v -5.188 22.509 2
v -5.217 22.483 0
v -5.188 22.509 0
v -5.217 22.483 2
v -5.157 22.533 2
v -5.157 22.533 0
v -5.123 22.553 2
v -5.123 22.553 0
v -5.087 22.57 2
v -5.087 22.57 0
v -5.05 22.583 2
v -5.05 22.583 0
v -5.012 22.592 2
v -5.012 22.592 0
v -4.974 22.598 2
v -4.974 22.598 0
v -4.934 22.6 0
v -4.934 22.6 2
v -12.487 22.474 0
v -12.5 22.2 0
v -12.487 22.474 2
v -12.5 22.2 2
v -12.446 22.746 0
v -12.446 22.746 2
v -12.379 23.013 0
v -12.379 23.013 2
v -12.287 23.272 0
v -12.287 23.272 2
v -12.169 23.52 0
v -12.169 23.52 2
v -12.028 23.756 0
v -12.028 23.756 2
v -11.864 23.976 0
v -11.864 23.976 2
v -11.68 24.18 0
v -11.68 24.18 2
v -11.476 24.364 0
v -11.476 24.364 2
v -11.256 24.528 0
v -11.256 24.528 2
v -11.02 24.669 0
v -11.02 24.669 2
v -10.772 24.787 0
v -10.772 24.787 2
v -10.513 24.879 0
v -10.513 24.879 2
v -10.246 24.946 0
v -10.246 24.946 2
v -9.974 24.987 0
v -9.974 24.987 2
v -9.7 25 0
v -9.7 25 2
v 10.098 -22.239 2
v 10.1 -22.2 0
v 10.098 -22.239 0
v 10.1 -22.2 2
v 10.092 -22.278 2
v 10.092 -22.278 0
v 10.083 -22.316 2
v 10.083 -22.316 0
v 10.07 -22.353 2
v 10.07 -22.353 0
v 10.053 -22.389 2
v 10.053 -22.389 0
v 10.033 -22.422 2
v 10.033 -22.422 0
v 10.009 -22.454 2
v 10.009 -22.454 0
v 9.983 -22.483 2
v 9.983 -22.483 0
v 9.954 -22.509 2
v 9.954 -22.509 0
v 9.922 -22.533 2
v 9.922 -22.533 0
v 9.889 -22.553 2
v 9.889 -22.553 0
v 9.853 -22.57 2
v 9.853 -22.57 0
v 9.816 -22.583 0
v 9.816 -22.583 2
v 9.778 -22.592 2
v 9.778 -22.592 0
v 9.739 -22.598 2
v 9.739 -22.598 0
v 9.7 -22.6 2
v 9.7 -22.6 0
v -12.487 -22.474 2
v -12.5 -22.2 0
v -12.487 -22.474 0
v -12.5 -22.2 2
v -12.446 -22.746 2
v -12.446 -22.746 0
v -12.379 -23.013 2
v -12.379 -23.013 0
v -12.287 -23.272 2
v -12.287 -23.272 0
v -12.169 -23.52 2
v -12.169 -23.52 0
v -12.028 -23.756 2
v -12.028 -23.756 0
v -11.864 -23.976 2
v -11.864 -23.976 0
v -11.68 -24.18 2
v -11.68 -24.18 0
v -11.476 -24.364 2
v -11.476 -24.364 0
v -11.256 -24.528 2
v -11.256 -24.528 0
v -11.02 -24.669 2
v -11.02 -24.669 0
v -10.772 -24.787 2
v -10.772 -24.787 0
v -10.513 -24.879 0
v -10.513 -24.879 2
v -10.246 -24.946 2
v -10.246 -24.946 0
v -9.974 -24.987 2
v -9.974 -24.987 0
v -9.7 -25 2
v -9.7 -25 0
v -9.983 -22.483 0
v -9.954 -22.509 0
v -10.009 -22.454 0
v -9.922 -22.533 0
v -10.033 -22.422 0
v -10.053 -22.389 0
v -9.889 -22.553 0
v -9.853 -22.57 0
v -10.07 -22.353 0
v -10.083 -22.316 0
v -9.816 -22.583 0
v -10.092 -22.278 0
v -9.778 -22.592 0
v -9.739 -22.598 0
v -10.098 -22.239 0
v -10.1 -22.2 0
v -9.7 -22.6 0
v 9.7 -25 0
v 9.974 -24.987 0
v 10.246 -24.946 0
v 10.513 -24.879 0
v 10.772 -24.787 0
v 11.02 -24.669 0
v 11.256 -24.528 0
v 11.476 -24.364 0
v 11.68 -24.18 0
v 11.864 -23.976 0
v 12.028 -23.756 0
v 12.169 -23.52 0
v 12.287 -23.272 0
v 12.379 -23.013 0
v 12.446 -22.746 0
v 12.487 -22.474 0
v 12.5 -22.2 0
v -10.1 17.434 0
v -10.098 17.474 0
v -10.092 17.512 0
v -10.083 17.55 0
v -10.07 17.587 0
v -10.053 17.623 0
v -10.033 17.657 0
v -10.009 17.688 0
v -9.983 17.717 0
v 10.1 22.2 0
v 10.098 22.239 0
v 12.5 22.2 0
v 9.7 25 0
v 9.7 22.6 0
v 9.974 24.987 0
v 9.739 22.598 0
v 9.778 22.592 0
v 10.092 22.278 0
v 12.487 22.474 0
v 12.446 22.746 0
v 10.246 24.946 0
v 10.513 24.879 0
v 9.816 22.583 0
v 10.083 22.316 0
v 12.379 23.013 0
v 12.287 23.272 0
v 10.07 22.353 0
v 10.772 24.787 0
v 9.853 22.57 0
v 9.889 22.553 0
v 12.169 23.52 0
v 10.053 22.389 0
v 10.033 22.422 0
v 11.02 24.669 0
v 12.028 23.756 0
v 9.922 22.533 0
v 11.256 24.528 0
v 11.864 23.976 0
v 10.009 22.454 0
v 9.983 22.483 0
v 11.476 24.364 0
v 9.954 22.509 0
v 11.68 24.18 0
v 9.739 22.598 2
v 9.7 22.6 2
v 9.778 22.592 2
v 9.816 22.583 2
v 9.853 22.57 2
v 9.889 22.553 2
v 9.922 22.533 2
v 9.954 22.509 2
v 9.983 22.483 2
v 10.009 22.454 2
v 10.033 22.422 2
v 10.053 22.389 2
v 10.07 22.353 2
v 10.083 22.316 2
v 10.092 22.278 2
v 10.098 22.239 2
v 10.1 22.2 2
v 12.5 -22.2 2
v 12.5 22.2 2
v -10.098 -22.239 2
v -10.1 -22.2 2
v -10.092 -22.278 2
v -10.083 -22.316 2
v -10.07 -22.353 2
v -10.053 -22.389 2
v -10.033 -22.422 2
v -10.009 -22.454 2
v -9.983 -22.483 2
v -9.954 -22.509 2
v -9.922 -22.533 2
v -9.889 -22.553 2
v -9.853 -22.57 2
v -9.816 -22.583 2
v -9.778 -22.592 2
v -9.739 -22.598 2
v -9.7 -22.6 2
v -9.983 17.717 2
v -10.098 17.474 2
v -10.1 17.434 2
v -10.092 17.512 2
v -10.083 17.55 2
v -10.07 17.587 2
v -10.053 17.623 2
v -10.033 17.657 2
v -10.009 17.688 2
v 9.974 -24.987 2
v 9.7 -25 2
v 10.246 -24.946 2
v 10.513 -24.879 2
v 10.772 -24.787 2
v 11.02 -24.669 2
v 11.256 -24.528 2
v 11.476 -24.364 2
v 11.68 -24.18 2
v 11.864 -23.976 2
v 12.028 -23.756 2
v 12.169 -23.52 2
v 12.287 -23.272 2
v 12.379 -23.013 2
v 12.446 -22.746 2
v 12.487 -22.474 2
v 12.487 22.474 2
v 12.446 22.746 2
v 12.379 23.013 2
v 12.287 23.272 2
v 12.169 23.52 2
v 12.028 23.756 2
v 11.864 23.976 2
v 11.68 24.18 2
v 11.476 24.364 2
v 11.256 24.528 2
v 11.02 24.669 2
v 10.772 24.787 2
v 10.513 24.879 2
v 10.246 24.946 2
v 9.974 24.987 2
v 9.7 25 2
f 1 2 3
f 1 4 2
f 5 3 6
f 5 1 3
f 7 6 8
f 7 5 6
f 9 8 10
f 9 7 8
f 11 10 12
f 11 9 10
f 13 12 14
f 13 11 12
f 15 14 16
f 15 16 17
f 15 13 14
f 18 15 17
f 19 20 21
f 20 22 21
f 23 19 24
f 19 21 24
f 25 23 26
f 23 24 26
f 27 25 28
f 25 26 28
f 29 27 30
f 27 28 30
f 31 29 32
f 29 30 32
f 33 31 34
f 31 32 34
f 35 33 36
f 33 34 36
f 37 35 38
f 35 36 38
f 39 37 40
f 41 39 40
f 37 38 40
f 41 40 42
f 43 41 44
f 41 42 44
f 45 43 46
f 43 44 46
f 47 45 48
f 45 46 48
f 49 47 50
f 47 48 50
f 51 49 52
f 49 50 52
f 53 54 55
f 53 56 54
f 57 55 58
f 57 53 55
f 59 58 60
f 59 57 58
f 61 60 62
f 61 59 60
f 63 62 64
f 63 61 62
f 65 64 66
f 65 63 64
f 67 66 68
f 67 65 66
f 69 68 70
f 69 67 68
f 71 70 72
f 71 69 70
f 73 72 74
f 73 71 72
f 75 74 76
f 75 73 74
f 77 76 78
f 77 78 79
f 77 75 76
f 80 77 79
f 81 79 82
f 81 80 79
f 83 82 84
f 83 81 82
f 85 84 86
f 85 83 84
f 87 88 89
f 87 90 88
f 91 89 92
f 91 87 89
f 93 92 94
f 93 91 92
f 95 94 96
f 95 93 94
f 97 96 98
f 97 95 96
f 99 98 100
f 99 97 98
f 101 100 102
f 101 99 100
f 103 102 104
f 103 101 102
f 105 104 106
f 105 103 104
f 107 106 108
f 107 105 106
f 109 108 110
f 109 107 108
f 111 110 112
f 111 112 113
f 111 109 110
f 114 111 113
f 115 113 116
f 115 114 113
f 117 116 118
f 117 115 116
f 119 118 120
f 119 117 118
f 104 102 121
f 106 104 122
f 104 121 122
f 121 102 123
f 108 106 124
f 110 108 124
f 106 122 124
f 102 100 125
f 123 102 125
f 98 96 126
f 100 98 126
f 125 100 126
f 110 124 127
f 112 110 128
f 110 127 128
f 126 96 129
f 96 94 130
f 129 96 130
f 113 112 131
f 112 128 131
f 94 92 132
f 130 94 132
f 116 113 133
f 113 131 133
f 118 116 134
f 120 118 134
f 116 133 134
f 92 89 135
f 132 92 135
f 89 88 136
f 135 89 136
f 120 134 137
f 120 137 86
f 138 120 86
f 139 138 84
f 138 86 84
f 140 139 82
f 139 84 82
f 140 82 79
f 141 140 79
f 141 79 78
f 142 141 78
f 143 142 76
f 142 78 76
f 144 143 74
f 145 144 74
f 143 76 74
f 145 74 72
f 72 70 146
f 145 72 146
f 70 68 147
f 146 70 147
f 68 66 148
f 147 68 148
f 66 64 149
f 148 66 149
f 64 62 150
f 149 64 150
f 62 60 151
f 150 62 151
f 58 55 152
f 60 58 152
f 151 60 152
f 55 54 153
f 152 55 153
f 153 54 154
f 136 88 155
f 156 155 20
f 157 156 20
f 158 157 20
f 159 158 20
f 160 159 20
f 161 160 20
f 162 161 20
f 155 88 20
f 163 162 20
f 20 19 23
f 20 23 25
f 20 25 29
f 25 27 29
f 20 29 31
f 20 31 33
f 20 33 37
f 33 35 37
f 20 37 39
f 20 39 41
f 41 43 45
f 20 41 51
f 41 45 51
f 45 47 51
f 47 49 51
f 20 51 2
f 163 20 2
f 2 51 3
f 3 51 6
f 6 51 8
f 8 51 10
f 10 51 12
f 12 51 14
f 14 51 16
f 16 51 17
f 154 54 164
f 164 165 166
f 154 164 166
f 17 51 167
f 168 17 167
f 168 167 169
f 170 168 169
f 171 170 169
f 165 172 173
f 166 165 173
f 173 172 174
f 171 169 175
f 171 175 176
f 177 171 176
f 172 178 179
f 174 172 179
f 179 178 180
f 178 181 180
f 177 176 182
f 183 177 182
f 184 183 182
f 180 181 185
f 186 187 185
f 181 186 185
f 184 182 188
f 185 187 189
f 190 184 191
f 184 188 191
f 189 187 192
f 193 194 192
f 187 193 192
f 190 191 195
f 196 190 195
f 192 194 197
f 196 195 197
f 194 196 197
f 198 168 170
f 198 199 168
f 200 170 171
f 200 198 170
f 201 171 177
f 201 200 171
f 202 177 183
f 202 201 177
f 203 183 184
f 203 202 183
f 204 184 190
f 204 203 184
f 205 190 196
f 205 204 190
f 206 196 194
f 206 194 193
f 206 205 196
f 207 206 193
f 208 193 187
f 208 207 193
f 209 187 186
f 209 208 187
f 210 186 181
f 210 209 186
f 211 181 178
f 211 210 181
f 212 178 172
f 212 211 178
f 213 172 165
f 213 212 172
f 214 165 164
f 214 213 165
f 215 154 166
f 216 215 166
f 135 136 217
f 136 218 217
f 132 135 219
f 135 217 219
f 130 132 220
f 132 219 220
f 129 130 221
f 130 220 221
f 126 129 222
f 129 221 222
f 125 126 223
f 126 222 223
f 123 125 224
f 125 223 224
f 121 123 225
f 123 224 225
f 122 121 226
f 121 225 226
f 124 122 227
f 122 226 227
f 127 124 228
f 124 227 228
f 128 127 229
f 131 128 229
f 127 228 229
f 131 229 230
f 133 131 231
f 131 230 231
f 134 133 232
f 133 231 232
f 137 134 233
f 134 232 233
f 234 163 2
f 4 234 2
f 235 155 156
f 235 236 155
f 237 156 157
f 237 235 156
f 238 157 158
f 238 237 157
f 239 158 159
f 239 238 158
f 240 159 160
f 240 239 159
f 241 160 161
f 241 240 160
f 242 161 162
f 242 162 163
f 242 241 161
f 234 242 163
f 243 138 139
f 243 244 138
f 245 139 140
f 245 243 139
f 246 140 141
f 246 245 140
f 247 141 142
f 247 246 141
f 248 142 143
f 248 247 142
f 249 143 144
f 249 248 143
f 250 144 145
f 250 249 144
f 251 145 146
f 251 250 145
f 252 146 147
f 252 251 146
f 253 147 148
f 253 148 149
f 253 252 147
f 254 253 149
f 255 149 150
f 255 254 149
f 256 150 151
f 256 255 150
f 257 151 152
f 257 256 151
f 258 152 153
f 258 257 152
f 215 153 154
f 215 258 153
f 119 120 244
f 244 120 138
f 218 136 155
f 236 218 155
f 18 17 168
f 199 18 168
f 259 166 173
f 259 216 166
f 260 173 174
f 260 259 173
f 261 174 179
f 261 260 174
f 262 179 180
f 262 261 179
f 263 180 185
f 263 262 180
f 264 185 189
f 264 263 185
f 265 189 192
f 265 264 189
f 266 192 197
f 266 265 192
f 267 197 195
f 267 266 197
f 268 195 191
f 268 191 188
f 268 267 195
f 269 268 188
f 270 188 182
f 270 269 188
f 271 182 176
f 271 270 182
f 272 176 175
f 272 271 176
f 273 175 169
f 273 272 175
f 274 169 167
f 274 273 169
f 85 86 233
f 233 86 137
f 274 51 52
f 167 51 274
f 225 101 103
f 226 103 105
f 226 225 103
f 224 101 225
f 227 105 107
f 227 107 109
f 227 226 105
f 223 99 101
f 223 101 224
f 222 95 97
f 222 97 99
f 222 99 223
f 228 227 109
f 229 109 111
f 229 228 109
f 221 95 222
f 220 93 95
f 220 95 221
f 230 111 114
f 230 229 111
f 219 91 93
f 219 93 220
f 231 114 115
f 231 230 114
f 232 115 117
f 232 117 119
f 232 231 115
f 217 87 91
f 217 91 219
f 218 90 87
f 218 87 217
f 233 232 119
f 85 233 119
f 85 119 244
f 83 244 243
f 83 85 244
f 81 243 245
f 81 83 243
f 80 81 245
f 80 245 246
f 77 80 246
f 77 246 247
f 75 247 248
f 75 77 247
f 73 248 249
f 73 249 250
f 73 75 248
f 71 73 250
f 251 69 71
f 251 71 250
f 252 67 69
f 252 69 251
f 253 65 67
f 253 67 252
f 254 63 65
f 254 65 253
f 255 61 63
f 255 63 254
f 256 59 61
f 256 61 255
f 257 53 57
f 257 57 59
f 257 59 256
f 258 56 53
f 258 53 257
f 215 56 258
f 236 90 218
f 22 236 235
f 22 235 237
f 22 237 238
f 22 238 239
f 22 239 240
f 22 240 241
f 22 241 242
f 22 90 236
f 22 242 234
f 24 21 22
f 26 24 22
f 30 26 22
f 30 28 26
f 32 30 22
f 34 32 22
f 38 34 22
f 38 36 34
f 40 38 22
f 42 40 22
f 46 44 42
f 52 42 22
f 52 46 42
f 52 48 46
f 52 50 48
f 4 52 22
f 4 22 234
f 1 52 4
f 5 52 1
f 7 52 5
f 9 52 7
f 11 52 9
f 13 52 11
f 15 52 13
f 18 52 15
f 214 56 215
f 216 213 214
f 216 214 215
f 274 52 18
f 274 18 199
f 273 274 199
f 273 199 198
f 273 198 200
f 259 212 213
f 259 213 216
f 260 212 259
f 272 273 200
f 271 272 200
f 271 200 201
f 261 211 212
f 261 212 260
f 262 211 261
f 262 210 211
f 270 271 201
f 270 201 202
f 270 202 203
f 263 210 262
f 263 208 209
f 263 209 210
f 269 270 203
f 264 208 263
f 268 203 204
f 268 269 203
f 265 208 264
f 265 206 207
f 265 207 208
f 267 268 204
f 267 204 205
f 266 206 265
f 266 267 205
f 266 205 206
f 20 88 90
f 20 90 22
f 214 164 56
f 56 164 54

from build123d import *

# Parameters (mm, degrees)
F0_W     = 25
F0_H     = 50
F1_DEPTH = 2
F2_R     = 2.8
F3_R     = 0.4


with BuildPart() as f1:
    # F0 (on Top) → F1 (new body)
    with BuildSketch(Plane.XY):
        Rectangle(F0_W, F0_H)
        Polygon((-10.1, 17.6), (-10.1, 22.6), (-5.1, 22.6), (10.1, 22.6), (10.1, -22.6), (-10.1, -22.6), align=None, mode=Mode.SUBTRACT)
        Polygon((-5.1, 22.6), (-10.1, 22.6), (-10.1, 17.6), align=None)
    extrude(amount=F1_DEPTH)

    # F2
    f2_edges = [f1.edges().sort_by_distance(p)[0] for p in [
        (-12.5, 25, 1),
        (-12.5, -25, 1),
        (12.5, -25, 1),
        (12.5, 25, 1),
    ]]
    fillet(f2_edges, radius=F2_R)

    # F3
    f3_edges = [f1.edges().sort_by_distance(p)[0] for p in [
        (10.1, 22.6, 1),
        (-5.1, 22.6, 1),
        (-10.1, 17.6, 1),
        (-10.1, -22.6, 1),
        (10.1, -22.6, 1),
    ]]
    fillet(f3_edges, radius=F3_R)


solid = f1.part
